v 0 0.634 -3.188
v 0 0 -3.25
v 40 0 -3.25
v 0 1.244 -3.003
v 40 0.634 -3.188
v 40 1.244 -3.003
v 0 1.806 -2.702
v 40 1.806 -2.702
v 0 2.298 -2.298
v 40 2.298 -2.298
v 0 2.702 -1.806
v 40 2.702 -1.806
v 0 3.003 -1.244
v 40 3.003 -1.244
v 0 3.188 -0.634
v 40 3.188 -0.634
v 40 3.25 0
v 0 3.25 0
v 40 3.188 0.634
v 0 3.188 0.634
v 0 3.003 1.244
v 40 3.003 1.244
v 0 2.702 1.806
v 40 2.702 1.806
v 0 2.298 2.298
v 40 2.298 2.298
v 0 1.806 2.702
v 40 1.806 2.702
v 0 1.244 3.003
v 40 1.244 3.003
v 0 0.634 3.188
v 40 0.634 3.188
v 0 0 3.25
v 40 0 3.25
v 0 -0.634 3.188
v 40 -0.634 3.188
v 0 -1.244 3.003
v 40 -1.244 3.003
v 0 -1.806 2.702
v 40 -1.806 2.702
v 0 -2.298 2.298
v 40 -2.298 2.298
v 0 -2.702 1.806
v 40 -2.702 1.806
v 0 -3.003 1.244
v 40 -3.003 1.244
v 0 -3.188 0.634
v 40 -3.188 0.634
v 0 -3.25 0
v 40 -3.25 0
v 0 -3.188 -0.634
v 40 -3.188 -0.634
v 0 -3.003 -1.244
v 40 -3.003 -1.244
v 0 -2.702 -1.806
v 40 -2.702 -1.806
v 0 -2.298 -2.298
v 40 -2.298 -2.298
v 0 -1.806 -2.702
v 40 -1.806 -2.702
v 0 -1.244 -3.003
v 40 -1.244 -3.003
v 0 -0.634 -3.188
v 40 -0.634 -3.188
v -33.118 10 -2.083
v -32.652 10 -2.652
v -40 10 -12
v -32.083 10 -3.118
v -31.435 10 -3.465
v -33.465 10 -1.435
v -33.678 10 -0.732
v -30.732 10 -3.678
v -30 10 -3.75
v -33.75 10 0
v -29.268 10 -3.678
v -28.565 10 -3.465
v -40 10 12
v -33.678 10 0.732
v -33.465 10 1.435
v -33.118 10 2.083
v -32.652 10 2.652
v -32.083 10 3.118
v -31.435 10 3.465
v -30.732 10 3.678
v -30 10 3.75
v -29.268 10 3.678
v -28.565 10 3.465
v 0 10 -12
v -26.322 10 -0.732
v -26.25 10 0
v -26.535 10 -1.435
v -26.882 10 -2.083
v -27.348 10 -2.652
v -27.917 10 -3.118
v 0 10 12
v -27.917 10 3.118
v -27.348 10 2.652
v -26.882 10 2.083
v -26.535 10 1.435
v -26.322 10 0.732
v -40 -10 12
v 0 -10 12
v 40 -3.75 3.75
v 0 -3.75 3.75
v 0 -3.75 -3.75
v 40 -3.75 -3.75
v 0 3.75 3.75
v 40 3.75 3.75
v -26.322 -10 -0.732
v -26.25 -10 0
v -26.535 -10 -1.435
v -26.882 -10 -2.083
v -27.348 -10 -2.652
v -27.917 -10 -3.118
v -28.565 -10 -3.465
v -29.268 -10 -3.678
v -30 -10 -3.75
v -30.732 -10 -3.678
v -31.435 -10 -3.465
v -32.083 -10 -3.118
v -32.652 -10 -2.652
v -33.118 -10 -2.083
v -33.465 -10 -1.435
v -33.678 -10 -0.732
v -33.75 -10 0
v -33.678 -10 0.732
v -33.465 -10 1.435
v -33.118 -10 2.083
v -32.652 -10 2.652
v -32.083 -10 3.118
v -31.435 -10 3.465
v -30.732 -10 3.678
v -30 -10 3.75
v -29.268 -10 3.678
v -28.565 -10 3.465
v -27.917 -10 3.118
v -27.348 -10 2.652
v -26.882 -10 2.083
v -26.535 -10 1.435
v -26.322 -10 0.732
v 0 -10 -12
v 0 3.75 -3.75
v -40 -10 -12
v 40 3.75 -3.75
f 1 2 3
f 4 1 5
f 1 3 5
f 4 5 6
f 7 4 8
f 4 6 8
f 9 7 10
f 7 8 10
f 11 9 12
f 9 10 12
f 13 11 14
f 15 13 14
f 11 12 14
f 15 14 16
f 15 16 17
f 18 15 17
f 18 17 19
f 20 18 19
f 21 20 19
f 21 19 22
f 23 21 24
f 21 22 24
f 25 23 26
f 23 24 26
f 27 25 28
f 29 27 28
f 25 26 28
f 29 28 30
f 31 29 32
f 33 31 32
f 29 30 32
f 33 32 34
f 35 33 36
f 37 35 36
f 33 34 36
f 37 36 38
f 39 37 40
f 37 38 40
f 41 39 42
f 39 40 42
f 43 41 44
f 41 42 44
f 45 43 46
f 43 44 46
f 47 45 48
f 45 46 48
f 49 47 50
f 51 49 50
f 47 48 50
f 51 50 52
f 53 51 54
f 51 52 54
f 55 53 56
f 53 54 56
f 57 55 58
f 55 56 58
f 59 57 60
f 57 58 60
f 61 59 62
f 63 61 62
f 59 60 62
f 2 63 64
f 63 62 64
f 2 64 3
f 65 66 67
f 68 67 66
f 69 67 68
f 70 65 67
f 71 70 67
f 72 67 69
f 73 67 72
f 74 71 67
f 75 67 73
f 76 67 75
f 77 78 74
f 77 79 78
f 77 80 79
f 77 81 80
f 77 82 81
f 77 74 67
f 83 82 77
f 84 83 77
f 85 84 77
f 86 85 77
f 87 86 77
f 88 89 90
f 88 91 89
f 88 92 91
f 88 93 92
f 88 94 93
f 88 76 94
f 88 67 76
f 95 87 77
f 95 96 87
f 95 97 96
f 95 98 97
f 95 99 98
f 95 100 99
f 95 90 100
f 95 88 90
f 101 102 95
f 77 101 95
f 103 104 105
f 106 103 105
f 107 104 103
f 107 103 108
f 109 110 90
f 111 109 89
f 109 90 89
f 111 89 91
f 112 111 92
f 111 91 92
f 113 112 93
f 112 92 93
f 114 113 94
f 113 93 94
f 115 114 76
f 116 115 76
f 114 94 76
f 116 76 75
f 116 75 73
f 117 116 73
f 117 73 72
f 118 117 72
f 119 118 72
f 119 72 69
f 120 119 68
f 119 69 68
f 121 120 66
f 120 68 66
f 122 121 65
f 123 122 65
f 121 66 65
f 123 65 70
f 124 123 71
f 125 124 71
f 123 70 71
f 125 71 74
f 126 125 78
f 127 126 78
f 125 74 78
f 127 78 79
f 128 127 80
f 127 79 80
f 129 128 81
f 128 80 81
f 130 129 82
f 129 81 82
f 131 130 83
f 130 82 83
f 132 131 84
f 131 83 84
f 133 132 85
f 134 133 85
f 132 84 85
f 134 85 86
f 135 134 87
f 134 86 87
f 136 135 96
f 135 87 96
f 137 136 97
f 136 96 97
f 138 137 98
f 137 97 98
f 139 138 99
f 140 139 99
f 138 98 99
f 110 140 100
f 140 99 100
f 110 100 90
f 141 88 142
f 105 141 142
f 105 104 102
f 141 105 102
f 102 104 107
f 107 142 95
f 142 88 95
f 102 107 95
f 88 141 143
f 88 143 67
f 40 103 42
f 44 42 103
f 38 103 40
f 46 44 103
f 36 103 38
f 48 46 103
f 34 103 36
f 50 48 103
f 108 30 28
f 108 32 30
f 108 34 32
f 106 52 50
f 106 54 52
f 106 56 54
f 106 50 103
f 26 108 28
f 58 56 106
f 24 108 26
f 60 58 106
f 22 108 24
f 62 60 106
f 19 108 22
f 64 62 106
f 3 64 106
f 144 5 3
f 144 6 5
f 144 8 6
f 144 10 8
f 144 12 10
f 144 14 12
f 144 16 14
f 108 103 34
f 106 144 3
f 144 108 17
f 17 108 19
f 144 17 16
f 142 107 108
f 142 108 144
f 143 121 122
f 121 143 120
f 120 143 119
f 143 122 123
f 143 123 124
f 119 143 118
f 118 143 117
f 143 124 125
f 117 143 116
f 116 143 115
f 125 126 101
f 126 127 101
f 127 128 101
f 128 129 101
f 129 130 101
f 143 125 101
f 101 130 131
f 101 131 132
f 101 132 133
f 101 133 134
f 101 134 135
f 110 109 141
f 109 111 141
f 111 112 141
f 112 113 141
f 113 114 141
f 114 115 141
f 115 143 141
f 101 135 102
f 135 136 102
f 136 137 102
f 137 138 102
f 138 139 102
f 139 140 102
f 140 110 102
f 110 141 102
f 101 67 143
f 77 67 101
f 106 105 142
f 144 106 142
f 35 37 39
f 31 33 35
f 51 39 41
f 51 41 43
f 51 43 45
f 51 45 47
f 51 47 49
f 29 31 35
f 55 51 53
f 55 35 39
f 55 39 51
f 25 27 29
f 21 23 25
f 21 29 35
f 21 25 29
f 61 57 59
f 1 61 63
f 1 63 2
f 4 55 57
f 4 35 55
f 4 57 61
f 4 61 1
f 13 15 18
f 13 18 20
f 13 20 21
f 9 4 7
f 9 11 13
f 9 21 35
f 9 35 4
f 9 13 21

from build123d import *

# Parameters (mm, degrees)
SKETCH1_W           = 7.5
SKETCH1_H           = 7.5
BOSS_EXTRUDE1_DEPTH = 40
SKETCH2_W           = 24
SKETCH2_H           = 20
BOSS_EXTRUDE2_DEPTH = 40
SKETCH4_R           = 3.75
CUT_EXTRUDE1_DEPTH  = 20
SKETCH3_R           = 3.25
CUT_EXTRUDE2_DEPTH  = 40


with BuildPart() as part:
    # Sketch1 → Boss-Extrude1 (new body)
    with BuildSketch(Plane(origin=(0, 0, 0), x_dir=(0, 0, -1), z_dir=(1, 0, 0))):
        Rectangle(SKETCH1_W, SKETCH1_H)
    extrude(amount=BOSS_EXTRUDE1_DEPTH)

    # Sketch2 → Boss-Extrude2 (add)
    with BuildSketch(Plane.ZY):
        Rectangle(SKETCH2_W, SKETCH2_H)
    extrude(amount=BOSS_EXTRUDE2_DEPTH)

    # Sketch4 → Cut-Extrude1 (cut)
    with BuildSketch(Plane(origin=(0, 10, 0), x_dir=(1, 0, 0), z_dir=(0, 1, 0))):
        with Locations((-30, 0)):
            Circle(SKETCH4_R)
    extrude(amount=-CUT_EXTRUDE1_DEPTH, mode=Mode.SUBTRACT)

    # Sketch3 → Cut-Extrude2 (cut)
    with BuildSketch(Plane(origin=(40, 0, 0), x_dir=(0, 0, -1), z_dir=(1, 0, 0))):
        Circle(SKETCH3_R)
    extrude(amount=-CUT_EXTRUDE2_DEPTH, mode=Mode.SUBTRACT)


solid = part.part
